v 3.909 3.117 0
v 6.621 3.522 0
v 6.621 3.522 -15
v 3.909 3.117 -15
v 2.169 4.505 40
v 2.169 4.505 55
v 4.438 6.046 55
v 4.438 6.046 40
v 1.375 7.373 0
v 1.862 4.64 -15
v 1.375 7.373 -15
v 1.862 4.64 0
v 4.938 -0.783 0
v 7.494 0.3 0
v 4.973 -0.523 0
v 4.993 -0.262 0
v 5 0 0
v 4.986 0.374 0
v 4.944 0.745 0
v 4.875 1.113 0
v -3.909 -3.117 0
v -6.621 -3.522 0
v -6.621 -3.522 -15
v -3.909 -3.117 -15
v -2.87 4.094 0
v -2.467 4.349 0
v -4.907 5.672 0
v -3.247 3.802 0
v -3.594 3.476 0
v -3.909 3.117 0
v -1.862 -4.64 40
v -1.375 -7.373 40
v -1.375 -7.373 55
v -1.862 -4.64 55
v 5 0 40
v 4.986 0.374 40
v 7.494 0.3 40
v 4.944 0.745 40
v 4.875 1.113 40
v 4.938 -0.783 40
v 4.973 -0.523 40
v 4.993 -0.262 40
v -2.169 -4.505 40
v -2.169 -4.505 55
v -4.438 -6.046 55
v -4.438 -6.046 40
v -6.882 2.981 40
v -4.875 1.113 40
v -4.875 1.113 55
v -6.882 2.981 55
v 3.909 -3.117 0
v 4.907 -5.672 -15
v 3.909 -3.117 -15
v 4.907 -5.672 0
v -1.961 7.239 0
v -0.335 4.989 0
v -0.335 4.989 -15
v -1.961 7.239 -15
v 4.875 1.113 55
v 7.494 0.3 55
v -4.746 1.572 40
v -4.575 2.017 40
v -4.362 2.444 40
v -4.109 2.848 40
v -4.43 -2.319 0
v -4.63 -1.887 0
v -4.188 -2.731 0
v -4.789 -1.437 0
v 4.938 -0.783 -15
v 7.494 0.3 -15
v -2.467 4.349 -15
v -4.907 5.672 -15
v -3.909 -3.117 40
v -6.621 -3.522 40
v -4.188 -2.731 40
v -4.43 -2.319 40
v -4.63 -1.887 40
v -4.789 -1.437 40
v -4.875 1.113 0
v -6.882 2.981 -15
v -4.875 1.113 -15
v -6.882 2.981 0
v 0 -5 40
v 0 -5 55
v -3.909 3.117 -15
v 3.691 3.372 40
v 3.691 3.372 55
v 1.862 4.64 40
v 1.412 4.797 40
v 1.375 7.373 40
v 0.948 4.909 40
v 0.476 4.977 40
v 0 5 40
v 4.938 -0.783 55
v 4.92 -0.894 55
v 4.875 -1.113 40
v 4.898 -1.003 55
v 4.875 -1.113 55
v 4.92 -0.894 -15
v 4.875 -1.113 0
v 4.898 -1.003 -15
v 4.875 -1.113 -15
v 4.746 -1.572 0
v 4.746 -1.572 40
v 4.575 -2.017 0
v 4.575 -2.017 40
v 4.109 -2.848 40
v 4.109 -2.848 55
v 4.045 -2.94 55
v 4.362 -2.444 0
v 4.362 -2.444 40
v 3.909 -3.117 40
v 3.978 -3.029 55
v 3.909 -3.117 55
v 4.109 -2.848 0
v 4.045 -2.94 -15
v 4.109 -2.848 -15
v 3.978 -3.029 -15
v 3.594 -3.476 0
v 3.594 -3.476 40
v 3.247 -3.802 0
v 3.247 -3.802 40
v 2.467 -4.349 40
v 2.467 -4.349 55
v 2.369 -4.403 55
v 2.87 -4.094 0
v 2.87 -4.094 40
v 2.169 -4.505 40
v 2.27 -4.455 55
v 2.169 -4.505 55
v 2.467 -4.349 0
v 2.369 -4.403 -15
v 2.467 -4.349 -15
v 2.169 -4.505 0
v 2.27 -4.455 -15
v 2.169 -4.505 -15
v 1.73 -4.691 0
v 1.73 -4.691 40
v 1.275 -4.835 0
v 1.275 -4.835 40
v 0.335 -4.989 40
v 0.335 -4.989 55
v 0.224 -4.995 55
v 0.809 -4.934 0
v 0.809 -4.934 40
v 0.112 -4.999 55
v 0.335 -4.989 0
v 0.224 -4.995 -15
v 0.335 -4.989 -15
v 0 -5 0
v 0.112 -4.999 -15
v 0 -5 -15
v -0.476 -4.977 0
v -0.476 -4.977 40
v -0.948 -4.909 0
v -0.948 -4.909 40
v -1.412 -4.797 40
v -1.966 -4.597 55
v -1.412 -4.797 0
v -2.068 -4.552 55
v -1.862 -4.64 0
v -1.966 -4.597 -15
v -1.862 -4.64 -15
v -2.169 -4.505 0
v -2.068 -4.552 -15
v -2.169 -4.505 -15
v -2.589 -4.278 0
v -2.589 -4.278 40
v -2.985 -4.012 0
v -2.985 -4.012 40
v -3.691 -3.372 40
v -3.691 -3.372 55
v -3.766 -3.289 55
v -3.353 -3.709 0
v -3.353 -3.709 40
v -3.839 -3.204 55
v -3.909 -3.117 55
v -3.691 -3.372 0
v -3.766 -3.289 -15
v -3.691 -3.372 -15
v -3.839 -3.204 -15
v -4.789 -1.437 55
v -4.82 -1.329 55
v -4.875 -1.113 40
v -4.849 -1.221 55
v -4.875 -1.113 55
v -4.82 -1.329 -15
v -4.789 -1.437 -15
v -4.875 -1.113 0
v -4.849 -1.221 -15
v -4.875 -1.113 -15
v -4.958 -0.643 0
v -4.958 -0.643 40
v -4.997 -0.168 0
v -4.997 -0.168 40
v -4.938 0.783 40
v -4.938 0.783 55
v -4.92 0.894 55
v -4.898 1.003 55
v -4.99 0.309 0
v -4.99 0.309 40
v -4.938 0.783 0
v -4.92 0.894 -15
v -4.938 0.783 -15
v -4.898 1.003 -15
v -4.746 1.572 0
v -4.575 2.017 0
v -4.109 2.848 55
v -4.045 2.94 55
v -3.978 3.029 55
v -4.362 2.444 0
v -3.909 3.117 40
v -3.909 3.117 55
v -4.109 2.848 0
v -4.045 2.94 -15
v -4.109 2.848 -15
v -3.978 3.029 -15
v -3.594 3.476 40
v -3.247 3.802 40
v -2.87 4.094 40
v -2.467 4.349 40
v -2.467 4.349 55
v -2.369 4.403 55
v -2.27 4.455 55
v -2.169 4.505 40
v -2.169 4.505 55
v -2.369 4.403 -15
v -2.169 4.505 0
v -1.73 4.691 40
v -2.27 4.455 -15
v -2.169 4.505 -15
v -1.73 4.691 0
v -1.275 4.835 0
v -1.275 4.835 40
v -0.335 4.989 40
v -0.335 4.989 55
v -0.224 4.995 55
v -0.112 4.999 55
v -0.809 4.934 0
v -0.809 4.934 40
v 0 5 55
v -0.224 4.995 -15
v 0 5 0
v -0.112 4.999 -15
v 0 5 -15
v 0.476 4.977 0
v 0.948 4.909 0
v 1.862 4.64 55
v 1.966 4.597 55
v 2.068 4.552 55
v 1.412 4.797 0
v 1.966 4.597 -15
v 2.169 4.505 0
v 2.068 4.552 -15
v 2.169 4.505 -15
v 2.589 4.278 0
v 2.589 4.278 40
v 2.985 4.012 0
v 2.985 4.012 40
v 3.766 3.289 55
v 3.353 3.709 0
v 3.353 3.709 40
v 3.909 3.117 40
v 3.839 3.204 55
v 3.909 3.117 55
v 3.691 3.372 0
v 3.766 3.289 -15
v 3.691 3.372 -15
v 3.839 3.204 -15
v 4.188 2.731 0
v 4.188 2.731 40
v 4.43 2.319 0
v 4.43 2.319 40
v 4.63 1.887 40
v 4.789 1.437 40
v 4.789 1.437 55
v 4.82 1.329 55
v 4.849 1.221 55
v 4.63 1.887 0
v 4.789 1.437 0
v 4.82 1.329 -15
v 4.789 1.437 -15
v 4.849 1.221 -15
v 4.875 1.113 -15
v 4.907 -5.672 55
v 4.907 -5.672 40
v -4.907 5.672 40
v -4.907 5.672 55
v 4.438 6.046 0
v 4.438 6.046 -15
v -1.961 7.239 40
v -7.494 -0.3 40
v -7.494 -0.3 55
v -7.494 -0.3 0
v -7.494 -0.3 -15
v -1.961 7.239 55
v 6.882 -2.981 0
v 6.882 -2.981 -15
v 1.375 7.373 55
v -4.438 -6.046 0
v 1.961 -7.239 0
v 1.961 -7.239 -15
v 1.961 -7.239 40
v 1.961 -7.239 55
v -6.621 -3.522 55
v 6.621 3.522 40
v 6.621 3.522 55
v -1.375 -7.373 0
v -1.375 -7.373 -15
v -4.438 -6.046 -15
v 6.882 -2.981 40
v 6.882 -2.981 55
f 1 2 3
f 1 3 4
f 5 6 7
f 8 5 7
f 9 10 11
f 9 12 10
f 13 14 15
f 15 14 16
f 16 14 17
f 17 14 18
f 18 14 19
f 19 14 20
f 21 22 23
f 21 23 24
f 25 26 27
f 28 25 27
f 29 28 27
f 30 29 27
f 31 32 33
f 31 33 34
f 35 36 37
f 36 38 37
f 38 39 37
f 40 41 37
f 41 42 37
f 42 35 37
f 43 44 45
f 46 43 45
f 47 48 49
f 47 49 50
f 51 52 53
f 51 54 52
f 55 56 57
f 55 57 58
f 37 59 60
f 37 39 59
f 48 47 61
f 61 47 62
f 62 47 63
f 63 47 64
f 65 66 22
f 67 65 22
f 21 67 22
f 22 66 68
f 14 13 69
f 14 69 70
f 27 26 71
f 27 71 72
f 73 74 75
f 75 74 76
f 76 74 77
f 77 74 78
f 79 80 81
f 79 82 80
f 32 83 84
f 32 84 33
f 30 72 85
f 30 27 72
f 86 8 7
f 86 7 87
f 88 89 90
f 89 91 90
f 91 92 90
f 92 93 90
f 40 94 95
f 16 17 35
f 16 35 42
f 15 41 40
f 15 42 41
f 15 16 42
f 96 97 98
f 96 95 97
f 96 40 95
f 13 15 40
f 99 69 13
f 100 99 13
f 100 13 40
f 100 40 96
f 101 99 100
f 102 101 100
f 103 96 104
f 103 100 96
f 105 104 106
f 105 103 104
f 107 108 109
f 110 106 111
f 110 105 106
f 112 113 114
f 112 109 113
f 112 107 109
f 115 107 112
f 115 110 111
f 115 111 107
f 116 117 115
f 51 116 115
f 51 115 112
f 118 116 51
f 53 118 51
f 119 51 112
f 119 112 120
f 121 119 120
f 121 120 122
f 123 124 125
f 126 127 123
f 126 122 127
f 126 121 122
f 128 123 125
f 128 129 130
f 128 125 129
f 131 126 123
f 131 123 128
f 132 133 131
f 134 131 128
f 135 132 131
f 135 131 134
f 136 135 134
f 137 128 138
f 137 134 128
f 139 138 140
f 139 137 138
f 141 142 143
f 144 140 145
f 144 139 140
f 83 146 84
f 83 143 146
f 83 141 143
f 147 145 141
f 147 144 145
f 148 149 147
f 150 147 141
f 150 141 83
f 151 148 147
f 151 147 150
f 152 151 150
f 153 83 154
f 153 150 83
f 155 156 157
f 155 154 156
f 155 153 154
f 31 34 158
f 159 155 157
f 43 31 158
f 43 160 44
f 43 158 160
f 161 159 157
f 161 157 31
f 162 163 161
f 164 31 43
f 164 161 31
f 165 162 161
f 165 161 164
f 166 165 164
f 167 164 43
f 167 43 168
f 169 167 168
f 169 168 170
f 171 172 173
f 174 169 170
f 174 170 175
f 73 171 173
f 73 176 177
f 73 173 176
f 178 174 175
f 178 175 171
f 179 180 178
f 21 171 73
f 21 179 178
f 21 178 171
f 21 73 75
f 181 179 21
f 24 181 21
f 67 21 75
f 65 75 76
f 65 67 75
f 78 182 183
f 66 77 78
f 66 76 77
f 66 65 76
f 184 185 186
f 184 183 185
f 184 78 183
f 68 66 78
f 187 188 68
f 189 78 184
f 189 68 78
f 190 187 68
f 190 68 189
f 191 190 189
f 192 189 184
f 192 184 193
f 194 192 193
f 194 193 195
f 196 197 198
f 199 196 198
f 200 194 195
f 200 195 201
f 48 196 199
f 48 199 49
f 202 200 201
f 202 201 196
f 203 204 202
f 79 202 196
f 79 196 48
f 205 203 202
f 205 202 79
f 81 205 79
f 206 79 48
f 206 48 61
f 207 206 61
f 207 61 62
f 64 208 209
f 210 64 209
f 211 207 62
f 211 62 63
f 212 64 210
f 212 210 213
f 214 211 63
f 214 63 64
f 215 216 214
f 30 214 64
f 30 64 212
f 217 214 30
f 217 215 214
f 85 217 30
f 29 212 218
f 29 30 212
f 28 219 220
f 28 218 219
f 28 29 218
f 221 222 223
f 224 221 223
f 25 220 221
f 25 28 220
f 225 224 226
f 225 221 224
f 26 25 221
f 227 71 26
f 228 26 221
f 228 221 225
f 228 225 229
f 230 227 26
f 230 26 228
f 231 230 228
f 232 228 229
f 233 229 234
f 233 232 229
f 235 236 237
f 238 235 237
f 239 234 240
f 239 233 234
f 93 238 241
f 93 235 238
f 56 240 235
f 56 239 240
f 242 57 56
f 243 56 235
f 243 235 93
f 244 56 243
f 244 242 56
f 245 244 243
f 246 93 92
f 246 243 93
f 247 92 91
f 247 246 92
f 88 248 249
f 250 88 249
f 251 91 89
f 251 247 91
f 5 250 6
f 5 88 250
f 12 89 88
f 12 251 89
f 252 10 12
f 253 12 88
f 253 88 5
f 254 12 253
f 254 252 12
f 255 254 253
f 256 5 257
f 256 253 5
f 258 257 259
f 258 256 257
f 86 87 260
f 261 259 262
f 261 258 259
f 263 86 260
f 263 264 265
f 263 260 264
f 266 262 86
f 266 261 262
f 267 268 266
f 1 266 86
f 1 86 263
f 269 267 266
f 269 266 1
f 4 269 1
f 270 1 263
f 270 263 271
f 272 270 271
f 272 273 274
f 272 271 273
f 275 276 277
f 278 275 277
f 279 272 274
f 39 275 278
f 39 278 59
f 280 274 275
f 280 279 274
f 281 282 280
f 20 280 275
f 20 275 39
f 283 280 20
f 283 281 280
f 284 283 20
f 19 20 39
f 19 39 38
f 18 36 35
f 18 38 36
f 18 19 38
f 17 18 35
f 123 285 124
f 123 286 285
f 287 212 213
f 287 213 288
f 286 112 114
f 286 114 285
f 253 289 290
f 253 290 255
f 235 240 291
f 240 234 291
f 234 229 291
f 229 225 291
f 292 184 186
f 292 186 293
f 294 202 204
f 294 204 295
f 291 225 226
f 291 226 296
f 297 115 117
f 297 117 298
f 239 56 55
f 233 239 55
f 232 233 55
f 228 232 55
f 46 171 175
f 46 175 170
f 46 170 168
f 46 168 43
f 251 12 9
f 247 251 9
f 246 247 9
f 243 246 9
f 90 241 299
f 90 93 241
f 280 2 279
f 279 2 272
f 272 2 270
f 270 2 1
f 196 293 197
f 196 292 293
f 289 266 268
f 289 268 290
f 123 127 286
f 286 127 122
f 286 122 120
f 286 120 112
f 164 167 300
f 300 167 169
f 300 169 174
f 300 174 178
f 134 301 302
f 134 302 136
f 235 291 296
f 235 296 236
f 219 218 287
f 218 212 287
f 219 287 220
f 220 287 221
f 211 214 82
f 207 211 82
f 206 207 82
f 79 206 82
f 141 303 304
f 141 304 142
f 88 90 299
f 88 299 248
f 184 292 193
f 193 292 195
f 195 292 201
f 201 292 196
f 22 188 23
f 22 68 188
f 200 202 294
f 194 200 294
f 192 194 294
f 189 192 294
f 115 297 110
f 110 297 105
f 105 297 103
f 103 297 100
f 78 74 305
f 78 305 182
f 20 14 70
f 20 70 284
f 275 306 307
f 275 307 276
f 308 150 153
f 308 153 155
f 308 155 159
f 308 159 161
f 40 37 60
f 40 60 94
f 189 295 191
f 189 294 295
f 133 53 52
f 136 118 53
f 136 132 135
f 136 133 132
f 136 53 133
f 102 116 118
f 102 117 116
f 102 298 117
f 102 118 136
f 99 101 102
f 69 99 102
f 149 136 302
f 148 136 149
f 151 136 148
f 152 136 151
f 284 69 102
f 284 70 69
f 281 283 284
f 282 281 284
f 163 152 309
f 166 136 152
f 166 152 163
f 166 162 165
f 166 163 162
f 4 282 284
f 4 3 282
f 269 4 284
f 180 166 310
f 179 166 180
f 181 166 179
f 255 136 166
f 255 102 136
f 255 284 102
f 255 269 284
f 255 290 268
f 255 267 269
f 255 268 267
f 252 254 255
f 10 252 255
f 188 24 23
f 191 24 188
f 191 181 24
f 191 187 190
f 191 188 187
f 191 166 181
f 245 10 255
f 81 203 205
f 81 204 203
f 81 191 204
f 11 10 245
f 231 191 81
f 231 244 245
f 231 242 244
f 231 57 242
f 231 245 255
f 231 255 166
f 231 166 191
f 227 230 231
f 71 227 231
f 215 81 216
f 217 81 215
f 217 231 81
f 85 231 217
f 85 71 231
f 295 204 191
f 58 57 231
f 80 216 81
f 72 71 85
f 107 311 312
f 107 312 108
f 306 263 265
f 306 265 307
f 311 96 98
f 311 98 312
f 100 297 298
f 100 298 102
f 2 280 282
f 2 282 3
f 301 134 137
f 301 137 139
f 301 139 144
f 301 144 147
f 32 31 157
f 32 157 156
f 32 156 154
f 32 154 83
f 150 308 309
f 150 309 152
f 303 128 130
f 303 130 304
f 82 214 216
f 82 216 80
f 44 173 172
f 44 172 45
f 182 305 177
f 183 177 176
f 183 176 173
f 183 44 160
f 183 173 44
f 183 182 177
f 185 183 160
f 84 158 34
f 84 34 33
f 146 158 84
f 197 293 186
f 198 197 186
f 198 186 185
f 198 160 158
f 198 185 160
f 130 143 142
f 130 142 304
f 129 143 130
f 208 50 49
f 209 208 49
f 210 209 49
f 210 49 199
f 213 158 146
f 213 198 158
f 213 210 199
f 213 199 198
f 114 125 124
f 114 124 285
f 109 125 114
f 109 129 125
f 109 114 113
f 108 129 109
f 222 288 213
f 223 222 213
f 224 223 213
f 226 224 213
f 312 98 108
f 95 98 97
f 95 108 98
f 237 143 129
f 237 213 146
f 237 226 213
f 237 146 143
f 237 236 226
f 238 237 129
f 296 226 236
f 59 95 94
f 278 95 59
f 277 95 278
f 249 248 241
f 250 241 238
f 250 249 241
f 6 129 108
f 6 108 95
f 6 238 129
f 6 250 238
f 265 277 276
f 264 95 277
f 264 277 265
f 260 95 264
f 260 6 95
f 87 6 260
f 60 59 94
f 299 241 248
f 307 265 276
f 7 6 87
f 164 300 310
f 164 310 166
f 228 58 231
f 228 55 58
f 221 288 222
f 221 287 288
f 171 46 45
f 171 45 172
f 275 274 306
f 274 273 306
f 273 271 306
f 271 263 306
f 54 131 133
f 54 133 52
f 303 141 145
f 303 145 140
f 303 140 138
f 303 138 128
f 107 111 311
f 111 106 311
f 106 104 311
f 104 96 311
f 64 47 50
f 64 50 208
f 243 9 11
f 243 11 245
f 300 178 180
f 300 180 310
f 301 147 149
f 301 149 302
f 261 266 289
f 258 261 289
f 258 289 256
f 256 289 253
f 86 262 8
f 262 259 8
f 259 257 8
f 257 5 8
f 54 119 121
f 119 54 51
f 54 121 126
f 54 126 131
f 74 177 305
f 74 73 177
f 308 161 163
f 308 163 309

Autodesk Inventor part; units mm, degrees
ref_plane "YZ Plane" through (0, 0, 0) normal (1, 0, 0) x (0, 1, 0)
ref_plane "XZ Plane" through (0, 0, 0) normal (0, 1, 0) x (-1, 0, 0)
ref_plane "XY Plane" through (0, 0, 0) normal (0, 0, 1) x (1, 0, 0)
sketch "Skizze1" plane through (0, 0, 0) normal (0, 0, 1) x (1, 0, 0)
  circle A0 centre (0, 0) radius 5
  dimension "d0" = 10
extrude "Extrusion1" add sketch "Skizze1" along normal blind 40
sketch "Skizze2" plane through (0, 0, 40) normal (0, 0, 1) x (1, 0, 0)
  circle A0 centre (0, 0) radius 5 projected
  circle A1 centre (0, 0) radius 7.5
  circle A2 centre (0, 0) radius 5 projected
  line L0 (0, -5) -> (-1.3746, -7.373)
  line L1 (-1.3746, -7.373) -> (-1.8625, -4.6402)
  arc A3 (-1.8625, -4.6402) -> (0, -5) centre (0, 0) ccw
  line L2 (2.1694, -4.5048) -> (1.9606, -7.2392)
  line L3 (1.9606, -7.2392) -> (0.3352, -4.9888)
  arc A4 (0.3352, -4.9888) -> (2.1694, -4.5048) centre (0, 0) ccw
  line L4 (3.9092, -3.1174) -> (4.9074, -5.6716)
  line L5 (4.9074, -5.6716) -> (2.4666, -4.3493)
  arc A5 (2.4666, -4.3493) -> (3.9092, -3.1174) centre (0, 0) ccw
  line L6 (4.8746, -1.1126) -> (6.8822, -2.9807)
  line L7 (6.8822, -2.9807) -> (4.1094, -2.8484)
  arc A6 (4.1094, -2.8484) -> (4.8746, -1.1126) centre (0, 0) ccw
  line L8 (4.8746, 1.1126) -> (7.494, 0.3005)
  line L9 (7.494, 0.3005) -> (4.9383, -0.7833)
  arc A7 (4.9383, -0.7833) -> (4.8746, 1.1126) centre (0, 0) ccw
  line L10 (3.9092, 3.1174) -> (6.6214, 3.5223)
  line L11 (6.6214, 3.5223) -> (4.7891, 1.4369)
  arc A8 (4.7891, 1.4369) -> (3.9092, 3.1174) centre (0, 0) ccw
  line L12 (2.1694, 4.5048) -> (4.4375, 6.0464)
  line L13 (4.4375, 6.0464) -> (3.6914, 3.3725)
  arc A9 (3.6914, 3.3725) -> (2.1694, 4.5048) centre (0, 0) ccw
  line L14 (0, 5) -> (1.3746, 7.373)
  line L15 (1.3746, 7.373) -> (1.8625, 4.6402)
  arc A10 (1.8625, 4.6402) -> (0, 5) centre (0, 0) ccw
  line L16 (-2.1694, 4.5048) -> (-1.9606, 7.2392)
  line L17 (-1.9606, 7.2392) -> (-0.3352, 4.9888)
  arc A11 (-0.3352, 4.9888) -> (-2.1694, 4.5048) centre (0, 0) ccw
  line L18 (-3.9092, 3.1174) -> (-4.9074, 5.6716)
  line L19 (-4.9074, 5.6716) -> (-2.4666, 4.3493)
  arc A12 (-2.4666, 4.3493) -> (-3.9092, 3.1174) centre (0, 0) ccw
  line L20 (-4.8746, 1.1126) -> (-6.8822, 2.9807)
  line L21 (-6.8822, 2.9807) -> (-4.1094, 2.8484)
  arc A13 (-4.1094, 2.8484) -> (-4.8746, 1.1126) centre (0, 0) ccw
  line L22 (-4.8746, -1.1126) -> (-7.494, -0.3005)
  line L23 (-7.494, -0.3005) -> (-4.9383, 0.7833)
  arc A14 (-4.9383, 0.7833) -> (-4.8746, -1.1126) centre (0, 0) ccw
  line L24 (-3.9092, -3.1174) -> (-6.6214, -3.5223)
  line L25 (-6.6214, -3.5223) -> (-4.7891, -1.4369)
  arc A15 (-4.7891, -1.4369) -> (-3.9092, -3.1174) centre (0, 0) ccw
  line L26 (-2.1694, -4.5048) -> (-4.4375, -6.0464)
  line L27 (-4.4375, -6.0464) -> (-3.6914, -3.3725)
  arc A16 (-3.6914, -3.3725) -> (-2.1694, -4.5048) centre (0, 0) ccw
  dimension "d3" = 15
  dimension "d6" = 360
extrude "Extrusion2" add sketch "Skizze2" along normal blind 15 contours A0 | A0 L8 L9 | A0 L10 L11 | L6 L7 A0 | A0 L12 L13 | L4 L5 A0 | L15 A0 L14 | L3 A0 L2 | L17 A0 L16 | L1 A0 L0 | L19 A0 L18 | L27 A0 L26 | L21 A0 L20 | L25 A0 L24 | L23 A0 L22
ref_plane "Arbeitsebene1" through (0, 0, 20) normal (0, 0, -1) x (-1, 0, 0)
mirror "Spiegeln2" about plane through (0, 0, 20) normal (0, 0, -1) of "Extrusion2"
equation "\"d0\" = Durchmesser3"
equation "\"d3\" = Durchmesser1"
equation "\"d8\" = Größe4"
equation "\"Durchmesser1\" = 15"
equation "\"Größe1\" = 7"
equation "\"Durchmesser2\" = 3"
equation "\"Durchmesser3\" = 10"
equation "\"Größe3\" = 3"
equation "\"Größe4\" = 15"
properties part number "WelleRuder1"
